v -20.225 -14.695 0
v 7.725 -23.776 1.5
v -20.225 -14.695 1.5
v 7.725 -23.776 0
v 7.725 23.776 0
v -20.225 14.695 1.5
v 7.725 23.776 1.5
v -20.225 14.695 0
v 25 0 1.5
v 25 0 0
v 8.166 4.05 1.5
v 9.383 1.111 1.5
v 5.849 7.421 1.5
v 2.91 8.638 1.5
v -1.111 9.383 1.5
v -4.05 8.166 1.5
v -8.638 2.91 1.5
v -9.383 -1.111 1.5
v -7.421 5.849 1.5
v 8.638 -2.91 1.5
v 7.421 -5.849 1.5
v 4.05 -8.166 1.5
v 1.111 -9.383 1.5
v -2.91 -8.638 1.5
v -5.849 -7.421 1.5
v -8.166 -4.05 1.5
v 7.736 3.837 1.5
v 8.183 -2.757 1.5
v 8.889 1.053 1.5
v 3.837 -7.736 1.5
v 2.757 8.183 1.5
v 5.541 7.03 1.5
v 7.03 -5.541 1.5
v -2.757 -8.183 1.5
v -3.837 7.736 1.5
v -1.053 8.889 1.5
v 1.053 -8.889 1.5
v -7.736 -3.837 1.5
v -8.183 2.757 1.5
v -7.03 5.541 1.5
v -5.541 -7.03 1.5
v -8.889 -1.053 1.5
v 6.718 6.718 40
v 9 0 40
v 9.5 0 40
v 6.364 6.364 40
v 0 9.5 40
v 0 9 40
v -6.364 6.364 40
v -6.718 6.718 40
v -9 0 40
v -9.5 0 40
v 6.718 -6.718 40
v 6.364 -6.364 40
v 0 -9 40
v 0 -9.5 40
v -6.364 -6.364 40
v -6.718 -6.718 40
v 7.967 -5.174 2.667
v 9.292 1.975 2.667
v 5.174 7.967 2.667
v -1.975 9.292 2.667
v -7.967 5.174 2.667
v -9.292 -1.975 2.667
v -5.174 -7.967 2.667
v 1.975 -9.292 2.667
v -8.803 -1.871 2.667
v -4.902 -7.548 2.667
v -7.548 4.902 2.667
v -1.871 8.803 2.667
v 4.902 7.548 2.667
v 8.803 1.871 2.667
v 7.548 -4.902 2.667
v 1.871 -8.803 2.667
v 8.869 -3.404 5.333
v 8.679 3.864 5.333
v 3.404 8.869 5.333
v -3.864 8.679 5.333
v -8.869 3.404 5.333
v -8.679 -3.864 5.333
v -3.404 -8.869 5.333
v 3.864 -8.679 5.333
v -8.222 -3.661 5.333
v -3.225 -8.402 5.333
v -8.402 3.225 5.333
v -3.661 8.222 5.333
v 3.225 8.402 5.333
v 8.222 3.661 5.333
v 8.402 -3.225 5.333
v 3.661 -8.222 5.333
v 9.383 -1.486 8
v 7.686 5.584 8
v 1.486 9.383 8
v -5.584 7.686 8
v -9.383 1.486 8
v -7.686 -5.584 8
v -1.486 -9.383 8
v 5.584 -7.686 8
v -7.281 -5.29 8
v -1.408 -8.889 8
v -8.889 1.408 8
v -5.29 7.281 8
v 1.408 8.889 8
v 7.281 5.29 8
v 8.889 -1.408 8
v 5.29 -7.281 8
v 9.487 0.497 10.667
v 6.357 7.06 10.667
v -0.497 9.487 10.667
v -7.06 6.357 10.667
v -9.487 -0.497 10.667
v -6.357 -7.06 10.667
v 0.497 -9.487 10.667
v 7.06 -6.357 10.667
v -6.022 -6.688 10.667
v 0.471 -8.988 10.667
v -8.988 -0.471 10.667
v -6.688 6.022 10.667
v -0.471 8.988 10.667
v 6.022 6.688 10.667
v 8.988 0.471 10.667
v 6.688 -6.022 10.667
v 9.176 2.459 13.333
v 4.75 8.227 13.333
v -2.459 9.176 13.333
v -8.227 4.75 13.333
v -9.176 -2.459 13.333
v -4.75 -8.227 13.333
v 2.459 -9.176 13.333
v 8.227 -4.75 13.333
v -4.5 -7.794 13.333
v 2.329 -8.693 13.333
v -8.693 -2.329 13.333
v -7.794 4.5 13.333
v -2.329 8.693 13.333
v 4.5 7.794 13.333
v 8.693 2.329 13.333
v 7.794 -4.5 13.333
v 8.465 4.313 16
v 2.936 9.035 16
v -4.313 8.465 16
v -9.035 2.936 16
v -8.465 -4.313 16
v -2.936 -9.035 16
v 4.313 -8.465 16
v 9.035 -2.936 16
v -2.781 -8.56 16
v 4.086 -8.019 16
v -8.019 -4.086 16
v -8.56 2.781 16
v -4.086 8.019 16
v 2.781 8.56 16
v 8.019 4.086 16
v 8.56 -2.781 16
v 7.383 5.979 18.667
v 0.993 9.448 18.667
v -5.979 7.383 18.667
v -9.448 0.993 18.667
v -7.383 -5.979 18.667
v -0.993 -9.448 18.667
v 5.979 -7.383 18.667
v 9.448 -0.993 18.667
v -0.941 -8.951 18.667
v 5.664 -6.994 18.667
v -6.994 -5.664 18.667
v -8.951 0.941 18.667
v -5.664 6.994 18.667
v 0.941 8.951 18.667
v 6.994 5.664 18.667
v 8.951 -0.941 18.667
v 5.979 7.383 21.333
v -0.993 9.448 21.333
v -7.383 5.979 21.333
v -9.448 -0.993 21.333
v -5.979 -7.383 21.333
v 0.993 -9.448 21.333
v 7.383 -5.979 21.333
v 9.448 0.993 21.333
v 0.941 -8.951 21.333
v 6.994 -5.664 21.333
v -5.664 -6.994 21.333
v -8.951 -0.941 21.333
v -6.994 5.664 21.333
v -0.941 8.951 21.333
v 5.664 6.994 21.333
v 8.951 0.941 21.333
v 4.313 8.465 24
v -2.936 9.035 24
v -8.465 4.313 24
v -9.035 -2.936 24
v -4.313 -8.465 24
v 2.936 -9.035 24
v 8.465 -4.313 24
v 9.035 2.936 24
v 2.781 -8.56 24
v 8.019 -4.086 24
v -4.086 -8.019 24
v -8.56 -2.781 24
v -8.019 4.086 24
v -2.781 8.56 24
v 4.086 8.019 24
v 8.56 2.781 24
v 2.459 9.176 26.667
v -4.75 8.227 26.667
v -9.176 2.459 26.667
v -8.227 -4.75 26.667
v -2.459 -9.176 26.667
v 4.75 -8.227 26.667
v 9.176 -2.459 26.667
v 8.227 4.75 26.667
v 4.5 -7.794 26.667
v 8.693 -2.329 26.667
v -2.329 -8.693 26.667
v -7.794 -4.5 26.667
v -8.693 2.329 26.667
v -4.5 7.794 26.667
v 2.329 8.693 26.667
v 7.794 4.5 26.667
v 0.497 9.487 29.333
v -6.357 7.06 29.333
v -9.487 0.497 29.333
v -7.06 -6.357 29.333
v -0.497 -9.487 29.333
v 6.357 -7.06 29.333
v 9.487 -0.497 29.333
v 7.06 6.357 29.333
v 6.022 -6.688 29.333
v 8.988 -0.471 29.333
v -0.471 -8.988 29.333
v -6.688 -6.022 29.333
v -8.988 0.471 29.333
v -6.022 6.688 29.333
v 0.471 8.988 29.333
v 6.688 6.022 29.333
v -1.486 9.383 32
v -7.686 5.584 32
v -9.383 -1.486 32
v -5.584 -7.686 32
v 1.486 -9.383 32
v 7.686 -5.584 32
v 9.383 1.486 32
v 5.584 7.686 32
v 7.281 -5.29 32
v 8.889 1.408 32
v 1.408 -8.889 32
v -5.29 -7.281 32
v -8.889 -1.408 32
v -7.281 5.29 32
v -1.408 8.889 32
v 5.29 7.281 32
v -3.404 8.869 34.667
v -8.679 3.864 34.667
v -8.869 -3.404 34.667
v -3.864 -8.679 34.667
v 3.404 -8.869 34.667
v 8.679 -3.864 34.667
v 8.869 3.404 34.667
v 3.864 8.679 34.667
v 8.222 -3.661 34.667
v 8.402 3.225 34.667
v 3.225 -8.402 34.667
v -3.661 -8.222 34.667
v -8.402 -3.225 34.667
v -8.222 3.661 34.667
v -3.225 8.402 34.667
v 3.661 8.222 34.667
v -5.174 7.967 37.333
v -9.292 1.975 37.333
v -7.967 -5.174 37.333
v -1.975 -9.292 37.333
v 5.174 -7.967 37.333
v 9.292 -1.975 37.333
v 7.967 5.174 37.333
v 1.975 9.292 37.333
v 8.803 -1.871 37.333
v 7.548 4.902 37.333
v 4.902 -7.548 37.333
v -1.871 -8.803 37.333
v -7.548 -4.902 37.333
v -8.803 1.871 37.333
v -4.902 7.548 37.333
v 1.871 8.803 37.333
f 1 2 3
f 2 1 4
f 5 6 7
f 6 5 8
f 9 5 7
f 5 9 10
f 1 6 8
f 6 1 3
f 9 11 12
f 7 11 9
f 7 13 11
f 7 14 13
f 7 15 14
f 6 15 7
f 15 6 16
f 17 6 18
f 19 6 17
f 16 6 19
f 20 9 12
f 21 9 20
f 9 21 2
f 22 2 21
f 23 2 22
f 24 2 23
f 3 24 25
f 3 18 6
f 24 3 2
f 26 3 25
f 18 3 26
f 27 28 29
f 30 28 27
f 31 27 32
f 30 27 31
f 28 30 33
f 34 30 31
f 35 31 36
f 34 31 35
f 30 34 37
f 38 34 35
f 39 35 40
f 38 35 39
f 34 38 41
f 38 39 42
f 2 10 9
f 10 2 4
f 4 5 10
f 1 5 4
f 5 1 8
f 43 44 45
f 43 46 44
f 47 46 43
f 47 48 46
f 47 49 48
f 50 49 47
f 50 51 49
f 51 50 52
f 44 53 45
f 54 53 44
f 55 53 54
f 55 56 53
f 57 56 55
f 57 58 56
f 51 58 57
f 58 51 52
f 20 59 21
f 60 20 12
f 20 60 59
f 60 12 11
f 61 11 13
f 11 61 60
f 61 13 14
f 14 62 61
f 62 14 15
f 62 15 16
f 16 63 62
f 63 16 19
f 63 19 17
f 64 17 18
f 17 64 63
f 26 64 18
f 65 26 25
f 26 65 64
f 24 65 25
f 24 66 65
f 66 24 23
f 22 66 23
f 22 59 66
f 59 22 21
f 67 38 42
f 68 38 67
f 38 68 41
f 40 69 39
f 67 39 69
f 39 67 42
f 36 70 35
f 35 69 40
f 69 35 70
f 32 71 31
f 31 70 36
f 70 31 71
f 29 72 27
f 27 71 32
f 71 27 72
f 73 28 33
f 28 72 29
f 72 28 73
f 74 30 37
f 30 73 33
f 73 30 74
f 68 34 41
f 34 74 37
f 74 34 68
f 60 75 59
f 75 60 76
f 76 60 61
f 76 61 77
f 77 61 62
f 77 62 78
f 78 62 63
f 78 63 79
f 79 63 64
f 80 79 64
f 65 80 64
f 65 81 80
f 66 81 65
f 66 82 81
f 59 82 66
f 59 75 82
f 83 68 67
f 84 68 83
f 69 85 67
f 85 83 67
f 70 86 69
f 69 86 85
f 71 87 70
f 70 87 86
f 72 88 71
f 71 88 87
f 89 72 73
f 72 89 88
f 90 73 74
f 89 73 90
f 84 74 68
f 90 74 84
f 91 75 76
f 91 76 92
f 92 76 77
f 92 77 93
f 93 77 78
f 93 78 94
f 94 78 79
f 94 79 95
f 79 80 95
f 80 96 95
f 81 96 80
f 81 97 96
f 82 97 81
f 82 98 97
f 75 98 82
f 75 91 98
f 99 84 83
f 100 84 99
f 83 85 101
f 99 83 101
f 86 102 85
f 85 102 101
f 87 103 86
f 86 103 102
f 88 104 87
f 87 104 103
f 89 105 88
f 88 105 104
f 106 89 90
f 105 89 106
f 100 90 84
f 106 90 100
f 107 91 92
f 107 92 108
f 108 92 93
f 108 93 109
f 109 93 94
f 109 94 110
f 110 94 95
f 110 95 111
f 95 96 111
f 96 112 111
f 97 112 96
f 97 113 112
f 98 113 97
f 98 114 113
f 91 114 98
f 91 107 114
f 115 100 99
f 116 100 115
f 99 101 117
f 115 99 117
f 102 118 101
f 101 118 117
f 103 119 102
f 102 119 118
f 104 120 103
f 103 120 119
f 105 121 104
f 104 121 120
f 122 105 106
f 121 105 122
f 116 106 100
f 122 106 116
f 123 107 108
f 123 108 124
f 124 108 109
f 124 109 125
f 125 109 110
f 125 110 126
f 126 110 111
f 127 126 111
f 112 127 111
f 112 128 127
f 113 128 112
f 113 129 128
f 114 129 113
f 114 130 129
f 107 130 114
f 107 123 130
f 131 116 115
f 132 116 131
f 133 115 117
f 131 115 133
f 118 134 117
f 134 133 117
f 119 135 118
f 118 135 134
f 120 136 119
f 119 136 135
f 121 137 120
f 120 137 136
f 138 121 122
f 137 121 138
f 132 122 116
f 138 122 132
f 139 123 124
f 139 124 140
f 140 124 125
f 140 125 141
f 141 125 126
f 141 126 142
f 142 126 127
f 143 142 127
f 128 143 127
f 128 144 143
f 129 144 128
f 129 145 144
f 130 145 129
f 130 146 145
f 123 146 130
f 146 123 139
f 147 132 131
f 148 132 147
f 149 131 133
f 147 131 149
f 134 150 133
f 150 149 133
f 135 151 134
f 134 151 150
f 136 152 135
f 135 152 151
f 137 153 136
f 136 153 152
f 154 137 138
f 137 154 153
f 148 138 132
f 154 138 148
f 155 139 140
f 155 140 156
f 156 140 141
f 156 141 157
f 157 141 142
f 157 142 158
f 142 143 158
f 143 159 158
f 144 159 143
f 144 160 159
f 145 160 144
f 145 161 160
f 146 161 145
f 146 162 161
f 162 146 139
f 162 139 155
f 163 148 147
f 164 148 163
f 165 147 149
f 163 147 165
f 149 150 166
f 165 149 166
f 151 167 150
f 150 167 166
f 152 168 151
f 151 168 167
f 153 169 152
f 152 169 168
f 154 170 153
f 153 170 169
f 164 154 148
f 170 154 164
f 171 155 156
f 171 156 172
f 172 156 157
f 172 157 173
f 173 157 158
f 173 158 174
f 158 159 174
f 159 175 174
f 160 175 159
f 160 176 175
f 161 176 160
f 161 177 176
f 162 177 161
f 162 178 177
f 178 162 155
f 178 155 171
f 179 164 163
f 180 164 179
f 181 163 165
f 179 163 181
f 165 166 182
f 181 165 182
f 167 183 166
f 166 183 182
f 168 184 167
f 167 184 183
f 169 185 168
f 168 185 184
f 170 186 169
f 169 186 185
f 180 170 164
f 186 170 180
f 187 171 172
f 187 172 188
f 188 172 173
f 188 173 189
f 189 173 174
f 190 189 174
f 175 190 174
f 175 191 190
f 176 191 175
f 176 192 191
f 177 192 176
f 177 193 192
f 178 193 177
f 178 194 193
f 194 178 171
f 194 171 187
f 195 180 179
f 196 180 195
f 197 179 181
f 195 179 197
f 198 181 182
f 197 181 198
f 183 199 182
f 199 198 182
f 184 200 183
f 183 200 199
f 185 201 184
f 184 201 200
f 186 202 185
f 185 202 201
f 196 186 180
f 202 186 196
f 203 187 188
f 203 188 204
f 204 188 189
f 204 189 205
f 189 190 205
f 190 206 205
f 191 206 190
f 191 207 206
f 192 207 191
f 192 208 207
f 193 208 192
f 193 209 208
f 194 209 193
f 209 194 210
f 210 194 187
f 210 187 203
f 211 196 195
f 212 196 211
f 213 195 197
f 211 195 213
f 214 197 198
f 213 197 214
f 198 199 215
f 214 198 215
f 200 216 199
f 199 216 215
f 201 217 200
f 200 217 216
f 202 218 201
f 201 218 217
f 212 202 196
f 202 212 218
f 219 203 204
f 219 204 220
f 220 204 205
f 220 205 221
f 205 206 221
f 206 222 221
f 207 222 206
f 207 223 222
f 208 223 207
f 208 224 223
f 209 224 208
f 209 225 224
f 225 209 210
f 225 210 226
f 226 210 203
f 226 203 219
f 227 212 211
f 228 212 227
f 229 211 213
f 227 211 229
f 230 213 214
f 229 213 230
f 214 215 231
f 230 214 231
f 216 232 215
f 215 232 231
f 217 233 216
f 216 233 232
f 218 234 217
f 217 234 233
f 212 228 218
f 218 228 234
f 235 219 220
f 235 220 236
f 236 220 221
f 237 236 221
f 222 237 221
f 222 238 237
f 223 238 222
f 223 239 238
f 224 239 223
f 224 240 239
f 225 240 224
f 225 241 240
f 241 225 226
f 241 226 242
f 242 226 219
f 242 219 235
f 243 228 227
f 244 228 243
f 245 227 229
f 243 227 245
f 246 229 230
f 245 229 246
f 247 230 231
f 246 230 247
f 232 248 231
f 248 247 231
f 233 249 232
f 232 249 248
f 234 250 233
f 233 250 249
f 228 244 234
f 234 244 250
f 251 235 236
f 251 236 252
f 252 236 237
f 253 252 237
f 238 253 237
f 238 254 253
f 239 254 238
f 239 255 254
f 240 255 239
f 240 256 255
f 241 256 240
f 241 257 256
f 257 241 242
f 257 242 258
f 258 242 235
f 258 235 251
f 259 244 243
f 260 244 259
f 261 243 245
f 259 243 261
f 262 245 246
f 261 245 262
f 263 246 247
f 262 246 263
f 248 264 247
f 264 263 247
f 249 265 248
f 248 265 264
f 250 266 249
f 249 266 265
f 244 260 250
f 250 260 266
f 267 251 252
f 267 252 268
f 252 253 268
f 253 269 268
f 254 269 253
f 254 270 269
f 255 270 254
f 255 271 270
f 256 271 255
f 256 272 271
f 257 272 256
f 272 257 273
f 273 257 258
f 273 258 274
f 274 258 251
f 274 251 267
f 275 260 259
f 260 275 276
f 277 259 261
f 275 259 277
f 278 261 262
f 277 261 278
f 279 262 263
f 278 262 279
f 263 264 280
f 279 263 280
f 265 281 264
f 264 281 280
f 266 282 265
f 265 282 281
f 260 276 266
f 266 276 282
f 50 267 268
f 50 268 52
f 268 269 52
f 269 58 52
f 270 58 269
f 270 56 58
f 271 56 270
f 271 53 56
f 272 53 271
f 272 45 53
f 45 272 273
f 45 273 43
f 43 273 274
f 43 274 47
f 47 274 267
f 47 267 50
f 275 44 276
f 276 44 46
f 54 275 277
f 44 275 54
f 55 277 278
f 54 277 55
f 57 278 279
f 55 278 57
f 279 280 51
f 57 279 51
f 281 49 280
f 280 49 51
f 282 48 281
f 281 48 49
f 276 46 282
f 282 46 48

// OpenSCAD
cylinder(d=50,1.5,$fn=5);

linear_extrude(height = 40,twist = -180 ){
difference(){
circle(d=19,$fn=8);
circle(d=18,$fn=8);
    }
}
